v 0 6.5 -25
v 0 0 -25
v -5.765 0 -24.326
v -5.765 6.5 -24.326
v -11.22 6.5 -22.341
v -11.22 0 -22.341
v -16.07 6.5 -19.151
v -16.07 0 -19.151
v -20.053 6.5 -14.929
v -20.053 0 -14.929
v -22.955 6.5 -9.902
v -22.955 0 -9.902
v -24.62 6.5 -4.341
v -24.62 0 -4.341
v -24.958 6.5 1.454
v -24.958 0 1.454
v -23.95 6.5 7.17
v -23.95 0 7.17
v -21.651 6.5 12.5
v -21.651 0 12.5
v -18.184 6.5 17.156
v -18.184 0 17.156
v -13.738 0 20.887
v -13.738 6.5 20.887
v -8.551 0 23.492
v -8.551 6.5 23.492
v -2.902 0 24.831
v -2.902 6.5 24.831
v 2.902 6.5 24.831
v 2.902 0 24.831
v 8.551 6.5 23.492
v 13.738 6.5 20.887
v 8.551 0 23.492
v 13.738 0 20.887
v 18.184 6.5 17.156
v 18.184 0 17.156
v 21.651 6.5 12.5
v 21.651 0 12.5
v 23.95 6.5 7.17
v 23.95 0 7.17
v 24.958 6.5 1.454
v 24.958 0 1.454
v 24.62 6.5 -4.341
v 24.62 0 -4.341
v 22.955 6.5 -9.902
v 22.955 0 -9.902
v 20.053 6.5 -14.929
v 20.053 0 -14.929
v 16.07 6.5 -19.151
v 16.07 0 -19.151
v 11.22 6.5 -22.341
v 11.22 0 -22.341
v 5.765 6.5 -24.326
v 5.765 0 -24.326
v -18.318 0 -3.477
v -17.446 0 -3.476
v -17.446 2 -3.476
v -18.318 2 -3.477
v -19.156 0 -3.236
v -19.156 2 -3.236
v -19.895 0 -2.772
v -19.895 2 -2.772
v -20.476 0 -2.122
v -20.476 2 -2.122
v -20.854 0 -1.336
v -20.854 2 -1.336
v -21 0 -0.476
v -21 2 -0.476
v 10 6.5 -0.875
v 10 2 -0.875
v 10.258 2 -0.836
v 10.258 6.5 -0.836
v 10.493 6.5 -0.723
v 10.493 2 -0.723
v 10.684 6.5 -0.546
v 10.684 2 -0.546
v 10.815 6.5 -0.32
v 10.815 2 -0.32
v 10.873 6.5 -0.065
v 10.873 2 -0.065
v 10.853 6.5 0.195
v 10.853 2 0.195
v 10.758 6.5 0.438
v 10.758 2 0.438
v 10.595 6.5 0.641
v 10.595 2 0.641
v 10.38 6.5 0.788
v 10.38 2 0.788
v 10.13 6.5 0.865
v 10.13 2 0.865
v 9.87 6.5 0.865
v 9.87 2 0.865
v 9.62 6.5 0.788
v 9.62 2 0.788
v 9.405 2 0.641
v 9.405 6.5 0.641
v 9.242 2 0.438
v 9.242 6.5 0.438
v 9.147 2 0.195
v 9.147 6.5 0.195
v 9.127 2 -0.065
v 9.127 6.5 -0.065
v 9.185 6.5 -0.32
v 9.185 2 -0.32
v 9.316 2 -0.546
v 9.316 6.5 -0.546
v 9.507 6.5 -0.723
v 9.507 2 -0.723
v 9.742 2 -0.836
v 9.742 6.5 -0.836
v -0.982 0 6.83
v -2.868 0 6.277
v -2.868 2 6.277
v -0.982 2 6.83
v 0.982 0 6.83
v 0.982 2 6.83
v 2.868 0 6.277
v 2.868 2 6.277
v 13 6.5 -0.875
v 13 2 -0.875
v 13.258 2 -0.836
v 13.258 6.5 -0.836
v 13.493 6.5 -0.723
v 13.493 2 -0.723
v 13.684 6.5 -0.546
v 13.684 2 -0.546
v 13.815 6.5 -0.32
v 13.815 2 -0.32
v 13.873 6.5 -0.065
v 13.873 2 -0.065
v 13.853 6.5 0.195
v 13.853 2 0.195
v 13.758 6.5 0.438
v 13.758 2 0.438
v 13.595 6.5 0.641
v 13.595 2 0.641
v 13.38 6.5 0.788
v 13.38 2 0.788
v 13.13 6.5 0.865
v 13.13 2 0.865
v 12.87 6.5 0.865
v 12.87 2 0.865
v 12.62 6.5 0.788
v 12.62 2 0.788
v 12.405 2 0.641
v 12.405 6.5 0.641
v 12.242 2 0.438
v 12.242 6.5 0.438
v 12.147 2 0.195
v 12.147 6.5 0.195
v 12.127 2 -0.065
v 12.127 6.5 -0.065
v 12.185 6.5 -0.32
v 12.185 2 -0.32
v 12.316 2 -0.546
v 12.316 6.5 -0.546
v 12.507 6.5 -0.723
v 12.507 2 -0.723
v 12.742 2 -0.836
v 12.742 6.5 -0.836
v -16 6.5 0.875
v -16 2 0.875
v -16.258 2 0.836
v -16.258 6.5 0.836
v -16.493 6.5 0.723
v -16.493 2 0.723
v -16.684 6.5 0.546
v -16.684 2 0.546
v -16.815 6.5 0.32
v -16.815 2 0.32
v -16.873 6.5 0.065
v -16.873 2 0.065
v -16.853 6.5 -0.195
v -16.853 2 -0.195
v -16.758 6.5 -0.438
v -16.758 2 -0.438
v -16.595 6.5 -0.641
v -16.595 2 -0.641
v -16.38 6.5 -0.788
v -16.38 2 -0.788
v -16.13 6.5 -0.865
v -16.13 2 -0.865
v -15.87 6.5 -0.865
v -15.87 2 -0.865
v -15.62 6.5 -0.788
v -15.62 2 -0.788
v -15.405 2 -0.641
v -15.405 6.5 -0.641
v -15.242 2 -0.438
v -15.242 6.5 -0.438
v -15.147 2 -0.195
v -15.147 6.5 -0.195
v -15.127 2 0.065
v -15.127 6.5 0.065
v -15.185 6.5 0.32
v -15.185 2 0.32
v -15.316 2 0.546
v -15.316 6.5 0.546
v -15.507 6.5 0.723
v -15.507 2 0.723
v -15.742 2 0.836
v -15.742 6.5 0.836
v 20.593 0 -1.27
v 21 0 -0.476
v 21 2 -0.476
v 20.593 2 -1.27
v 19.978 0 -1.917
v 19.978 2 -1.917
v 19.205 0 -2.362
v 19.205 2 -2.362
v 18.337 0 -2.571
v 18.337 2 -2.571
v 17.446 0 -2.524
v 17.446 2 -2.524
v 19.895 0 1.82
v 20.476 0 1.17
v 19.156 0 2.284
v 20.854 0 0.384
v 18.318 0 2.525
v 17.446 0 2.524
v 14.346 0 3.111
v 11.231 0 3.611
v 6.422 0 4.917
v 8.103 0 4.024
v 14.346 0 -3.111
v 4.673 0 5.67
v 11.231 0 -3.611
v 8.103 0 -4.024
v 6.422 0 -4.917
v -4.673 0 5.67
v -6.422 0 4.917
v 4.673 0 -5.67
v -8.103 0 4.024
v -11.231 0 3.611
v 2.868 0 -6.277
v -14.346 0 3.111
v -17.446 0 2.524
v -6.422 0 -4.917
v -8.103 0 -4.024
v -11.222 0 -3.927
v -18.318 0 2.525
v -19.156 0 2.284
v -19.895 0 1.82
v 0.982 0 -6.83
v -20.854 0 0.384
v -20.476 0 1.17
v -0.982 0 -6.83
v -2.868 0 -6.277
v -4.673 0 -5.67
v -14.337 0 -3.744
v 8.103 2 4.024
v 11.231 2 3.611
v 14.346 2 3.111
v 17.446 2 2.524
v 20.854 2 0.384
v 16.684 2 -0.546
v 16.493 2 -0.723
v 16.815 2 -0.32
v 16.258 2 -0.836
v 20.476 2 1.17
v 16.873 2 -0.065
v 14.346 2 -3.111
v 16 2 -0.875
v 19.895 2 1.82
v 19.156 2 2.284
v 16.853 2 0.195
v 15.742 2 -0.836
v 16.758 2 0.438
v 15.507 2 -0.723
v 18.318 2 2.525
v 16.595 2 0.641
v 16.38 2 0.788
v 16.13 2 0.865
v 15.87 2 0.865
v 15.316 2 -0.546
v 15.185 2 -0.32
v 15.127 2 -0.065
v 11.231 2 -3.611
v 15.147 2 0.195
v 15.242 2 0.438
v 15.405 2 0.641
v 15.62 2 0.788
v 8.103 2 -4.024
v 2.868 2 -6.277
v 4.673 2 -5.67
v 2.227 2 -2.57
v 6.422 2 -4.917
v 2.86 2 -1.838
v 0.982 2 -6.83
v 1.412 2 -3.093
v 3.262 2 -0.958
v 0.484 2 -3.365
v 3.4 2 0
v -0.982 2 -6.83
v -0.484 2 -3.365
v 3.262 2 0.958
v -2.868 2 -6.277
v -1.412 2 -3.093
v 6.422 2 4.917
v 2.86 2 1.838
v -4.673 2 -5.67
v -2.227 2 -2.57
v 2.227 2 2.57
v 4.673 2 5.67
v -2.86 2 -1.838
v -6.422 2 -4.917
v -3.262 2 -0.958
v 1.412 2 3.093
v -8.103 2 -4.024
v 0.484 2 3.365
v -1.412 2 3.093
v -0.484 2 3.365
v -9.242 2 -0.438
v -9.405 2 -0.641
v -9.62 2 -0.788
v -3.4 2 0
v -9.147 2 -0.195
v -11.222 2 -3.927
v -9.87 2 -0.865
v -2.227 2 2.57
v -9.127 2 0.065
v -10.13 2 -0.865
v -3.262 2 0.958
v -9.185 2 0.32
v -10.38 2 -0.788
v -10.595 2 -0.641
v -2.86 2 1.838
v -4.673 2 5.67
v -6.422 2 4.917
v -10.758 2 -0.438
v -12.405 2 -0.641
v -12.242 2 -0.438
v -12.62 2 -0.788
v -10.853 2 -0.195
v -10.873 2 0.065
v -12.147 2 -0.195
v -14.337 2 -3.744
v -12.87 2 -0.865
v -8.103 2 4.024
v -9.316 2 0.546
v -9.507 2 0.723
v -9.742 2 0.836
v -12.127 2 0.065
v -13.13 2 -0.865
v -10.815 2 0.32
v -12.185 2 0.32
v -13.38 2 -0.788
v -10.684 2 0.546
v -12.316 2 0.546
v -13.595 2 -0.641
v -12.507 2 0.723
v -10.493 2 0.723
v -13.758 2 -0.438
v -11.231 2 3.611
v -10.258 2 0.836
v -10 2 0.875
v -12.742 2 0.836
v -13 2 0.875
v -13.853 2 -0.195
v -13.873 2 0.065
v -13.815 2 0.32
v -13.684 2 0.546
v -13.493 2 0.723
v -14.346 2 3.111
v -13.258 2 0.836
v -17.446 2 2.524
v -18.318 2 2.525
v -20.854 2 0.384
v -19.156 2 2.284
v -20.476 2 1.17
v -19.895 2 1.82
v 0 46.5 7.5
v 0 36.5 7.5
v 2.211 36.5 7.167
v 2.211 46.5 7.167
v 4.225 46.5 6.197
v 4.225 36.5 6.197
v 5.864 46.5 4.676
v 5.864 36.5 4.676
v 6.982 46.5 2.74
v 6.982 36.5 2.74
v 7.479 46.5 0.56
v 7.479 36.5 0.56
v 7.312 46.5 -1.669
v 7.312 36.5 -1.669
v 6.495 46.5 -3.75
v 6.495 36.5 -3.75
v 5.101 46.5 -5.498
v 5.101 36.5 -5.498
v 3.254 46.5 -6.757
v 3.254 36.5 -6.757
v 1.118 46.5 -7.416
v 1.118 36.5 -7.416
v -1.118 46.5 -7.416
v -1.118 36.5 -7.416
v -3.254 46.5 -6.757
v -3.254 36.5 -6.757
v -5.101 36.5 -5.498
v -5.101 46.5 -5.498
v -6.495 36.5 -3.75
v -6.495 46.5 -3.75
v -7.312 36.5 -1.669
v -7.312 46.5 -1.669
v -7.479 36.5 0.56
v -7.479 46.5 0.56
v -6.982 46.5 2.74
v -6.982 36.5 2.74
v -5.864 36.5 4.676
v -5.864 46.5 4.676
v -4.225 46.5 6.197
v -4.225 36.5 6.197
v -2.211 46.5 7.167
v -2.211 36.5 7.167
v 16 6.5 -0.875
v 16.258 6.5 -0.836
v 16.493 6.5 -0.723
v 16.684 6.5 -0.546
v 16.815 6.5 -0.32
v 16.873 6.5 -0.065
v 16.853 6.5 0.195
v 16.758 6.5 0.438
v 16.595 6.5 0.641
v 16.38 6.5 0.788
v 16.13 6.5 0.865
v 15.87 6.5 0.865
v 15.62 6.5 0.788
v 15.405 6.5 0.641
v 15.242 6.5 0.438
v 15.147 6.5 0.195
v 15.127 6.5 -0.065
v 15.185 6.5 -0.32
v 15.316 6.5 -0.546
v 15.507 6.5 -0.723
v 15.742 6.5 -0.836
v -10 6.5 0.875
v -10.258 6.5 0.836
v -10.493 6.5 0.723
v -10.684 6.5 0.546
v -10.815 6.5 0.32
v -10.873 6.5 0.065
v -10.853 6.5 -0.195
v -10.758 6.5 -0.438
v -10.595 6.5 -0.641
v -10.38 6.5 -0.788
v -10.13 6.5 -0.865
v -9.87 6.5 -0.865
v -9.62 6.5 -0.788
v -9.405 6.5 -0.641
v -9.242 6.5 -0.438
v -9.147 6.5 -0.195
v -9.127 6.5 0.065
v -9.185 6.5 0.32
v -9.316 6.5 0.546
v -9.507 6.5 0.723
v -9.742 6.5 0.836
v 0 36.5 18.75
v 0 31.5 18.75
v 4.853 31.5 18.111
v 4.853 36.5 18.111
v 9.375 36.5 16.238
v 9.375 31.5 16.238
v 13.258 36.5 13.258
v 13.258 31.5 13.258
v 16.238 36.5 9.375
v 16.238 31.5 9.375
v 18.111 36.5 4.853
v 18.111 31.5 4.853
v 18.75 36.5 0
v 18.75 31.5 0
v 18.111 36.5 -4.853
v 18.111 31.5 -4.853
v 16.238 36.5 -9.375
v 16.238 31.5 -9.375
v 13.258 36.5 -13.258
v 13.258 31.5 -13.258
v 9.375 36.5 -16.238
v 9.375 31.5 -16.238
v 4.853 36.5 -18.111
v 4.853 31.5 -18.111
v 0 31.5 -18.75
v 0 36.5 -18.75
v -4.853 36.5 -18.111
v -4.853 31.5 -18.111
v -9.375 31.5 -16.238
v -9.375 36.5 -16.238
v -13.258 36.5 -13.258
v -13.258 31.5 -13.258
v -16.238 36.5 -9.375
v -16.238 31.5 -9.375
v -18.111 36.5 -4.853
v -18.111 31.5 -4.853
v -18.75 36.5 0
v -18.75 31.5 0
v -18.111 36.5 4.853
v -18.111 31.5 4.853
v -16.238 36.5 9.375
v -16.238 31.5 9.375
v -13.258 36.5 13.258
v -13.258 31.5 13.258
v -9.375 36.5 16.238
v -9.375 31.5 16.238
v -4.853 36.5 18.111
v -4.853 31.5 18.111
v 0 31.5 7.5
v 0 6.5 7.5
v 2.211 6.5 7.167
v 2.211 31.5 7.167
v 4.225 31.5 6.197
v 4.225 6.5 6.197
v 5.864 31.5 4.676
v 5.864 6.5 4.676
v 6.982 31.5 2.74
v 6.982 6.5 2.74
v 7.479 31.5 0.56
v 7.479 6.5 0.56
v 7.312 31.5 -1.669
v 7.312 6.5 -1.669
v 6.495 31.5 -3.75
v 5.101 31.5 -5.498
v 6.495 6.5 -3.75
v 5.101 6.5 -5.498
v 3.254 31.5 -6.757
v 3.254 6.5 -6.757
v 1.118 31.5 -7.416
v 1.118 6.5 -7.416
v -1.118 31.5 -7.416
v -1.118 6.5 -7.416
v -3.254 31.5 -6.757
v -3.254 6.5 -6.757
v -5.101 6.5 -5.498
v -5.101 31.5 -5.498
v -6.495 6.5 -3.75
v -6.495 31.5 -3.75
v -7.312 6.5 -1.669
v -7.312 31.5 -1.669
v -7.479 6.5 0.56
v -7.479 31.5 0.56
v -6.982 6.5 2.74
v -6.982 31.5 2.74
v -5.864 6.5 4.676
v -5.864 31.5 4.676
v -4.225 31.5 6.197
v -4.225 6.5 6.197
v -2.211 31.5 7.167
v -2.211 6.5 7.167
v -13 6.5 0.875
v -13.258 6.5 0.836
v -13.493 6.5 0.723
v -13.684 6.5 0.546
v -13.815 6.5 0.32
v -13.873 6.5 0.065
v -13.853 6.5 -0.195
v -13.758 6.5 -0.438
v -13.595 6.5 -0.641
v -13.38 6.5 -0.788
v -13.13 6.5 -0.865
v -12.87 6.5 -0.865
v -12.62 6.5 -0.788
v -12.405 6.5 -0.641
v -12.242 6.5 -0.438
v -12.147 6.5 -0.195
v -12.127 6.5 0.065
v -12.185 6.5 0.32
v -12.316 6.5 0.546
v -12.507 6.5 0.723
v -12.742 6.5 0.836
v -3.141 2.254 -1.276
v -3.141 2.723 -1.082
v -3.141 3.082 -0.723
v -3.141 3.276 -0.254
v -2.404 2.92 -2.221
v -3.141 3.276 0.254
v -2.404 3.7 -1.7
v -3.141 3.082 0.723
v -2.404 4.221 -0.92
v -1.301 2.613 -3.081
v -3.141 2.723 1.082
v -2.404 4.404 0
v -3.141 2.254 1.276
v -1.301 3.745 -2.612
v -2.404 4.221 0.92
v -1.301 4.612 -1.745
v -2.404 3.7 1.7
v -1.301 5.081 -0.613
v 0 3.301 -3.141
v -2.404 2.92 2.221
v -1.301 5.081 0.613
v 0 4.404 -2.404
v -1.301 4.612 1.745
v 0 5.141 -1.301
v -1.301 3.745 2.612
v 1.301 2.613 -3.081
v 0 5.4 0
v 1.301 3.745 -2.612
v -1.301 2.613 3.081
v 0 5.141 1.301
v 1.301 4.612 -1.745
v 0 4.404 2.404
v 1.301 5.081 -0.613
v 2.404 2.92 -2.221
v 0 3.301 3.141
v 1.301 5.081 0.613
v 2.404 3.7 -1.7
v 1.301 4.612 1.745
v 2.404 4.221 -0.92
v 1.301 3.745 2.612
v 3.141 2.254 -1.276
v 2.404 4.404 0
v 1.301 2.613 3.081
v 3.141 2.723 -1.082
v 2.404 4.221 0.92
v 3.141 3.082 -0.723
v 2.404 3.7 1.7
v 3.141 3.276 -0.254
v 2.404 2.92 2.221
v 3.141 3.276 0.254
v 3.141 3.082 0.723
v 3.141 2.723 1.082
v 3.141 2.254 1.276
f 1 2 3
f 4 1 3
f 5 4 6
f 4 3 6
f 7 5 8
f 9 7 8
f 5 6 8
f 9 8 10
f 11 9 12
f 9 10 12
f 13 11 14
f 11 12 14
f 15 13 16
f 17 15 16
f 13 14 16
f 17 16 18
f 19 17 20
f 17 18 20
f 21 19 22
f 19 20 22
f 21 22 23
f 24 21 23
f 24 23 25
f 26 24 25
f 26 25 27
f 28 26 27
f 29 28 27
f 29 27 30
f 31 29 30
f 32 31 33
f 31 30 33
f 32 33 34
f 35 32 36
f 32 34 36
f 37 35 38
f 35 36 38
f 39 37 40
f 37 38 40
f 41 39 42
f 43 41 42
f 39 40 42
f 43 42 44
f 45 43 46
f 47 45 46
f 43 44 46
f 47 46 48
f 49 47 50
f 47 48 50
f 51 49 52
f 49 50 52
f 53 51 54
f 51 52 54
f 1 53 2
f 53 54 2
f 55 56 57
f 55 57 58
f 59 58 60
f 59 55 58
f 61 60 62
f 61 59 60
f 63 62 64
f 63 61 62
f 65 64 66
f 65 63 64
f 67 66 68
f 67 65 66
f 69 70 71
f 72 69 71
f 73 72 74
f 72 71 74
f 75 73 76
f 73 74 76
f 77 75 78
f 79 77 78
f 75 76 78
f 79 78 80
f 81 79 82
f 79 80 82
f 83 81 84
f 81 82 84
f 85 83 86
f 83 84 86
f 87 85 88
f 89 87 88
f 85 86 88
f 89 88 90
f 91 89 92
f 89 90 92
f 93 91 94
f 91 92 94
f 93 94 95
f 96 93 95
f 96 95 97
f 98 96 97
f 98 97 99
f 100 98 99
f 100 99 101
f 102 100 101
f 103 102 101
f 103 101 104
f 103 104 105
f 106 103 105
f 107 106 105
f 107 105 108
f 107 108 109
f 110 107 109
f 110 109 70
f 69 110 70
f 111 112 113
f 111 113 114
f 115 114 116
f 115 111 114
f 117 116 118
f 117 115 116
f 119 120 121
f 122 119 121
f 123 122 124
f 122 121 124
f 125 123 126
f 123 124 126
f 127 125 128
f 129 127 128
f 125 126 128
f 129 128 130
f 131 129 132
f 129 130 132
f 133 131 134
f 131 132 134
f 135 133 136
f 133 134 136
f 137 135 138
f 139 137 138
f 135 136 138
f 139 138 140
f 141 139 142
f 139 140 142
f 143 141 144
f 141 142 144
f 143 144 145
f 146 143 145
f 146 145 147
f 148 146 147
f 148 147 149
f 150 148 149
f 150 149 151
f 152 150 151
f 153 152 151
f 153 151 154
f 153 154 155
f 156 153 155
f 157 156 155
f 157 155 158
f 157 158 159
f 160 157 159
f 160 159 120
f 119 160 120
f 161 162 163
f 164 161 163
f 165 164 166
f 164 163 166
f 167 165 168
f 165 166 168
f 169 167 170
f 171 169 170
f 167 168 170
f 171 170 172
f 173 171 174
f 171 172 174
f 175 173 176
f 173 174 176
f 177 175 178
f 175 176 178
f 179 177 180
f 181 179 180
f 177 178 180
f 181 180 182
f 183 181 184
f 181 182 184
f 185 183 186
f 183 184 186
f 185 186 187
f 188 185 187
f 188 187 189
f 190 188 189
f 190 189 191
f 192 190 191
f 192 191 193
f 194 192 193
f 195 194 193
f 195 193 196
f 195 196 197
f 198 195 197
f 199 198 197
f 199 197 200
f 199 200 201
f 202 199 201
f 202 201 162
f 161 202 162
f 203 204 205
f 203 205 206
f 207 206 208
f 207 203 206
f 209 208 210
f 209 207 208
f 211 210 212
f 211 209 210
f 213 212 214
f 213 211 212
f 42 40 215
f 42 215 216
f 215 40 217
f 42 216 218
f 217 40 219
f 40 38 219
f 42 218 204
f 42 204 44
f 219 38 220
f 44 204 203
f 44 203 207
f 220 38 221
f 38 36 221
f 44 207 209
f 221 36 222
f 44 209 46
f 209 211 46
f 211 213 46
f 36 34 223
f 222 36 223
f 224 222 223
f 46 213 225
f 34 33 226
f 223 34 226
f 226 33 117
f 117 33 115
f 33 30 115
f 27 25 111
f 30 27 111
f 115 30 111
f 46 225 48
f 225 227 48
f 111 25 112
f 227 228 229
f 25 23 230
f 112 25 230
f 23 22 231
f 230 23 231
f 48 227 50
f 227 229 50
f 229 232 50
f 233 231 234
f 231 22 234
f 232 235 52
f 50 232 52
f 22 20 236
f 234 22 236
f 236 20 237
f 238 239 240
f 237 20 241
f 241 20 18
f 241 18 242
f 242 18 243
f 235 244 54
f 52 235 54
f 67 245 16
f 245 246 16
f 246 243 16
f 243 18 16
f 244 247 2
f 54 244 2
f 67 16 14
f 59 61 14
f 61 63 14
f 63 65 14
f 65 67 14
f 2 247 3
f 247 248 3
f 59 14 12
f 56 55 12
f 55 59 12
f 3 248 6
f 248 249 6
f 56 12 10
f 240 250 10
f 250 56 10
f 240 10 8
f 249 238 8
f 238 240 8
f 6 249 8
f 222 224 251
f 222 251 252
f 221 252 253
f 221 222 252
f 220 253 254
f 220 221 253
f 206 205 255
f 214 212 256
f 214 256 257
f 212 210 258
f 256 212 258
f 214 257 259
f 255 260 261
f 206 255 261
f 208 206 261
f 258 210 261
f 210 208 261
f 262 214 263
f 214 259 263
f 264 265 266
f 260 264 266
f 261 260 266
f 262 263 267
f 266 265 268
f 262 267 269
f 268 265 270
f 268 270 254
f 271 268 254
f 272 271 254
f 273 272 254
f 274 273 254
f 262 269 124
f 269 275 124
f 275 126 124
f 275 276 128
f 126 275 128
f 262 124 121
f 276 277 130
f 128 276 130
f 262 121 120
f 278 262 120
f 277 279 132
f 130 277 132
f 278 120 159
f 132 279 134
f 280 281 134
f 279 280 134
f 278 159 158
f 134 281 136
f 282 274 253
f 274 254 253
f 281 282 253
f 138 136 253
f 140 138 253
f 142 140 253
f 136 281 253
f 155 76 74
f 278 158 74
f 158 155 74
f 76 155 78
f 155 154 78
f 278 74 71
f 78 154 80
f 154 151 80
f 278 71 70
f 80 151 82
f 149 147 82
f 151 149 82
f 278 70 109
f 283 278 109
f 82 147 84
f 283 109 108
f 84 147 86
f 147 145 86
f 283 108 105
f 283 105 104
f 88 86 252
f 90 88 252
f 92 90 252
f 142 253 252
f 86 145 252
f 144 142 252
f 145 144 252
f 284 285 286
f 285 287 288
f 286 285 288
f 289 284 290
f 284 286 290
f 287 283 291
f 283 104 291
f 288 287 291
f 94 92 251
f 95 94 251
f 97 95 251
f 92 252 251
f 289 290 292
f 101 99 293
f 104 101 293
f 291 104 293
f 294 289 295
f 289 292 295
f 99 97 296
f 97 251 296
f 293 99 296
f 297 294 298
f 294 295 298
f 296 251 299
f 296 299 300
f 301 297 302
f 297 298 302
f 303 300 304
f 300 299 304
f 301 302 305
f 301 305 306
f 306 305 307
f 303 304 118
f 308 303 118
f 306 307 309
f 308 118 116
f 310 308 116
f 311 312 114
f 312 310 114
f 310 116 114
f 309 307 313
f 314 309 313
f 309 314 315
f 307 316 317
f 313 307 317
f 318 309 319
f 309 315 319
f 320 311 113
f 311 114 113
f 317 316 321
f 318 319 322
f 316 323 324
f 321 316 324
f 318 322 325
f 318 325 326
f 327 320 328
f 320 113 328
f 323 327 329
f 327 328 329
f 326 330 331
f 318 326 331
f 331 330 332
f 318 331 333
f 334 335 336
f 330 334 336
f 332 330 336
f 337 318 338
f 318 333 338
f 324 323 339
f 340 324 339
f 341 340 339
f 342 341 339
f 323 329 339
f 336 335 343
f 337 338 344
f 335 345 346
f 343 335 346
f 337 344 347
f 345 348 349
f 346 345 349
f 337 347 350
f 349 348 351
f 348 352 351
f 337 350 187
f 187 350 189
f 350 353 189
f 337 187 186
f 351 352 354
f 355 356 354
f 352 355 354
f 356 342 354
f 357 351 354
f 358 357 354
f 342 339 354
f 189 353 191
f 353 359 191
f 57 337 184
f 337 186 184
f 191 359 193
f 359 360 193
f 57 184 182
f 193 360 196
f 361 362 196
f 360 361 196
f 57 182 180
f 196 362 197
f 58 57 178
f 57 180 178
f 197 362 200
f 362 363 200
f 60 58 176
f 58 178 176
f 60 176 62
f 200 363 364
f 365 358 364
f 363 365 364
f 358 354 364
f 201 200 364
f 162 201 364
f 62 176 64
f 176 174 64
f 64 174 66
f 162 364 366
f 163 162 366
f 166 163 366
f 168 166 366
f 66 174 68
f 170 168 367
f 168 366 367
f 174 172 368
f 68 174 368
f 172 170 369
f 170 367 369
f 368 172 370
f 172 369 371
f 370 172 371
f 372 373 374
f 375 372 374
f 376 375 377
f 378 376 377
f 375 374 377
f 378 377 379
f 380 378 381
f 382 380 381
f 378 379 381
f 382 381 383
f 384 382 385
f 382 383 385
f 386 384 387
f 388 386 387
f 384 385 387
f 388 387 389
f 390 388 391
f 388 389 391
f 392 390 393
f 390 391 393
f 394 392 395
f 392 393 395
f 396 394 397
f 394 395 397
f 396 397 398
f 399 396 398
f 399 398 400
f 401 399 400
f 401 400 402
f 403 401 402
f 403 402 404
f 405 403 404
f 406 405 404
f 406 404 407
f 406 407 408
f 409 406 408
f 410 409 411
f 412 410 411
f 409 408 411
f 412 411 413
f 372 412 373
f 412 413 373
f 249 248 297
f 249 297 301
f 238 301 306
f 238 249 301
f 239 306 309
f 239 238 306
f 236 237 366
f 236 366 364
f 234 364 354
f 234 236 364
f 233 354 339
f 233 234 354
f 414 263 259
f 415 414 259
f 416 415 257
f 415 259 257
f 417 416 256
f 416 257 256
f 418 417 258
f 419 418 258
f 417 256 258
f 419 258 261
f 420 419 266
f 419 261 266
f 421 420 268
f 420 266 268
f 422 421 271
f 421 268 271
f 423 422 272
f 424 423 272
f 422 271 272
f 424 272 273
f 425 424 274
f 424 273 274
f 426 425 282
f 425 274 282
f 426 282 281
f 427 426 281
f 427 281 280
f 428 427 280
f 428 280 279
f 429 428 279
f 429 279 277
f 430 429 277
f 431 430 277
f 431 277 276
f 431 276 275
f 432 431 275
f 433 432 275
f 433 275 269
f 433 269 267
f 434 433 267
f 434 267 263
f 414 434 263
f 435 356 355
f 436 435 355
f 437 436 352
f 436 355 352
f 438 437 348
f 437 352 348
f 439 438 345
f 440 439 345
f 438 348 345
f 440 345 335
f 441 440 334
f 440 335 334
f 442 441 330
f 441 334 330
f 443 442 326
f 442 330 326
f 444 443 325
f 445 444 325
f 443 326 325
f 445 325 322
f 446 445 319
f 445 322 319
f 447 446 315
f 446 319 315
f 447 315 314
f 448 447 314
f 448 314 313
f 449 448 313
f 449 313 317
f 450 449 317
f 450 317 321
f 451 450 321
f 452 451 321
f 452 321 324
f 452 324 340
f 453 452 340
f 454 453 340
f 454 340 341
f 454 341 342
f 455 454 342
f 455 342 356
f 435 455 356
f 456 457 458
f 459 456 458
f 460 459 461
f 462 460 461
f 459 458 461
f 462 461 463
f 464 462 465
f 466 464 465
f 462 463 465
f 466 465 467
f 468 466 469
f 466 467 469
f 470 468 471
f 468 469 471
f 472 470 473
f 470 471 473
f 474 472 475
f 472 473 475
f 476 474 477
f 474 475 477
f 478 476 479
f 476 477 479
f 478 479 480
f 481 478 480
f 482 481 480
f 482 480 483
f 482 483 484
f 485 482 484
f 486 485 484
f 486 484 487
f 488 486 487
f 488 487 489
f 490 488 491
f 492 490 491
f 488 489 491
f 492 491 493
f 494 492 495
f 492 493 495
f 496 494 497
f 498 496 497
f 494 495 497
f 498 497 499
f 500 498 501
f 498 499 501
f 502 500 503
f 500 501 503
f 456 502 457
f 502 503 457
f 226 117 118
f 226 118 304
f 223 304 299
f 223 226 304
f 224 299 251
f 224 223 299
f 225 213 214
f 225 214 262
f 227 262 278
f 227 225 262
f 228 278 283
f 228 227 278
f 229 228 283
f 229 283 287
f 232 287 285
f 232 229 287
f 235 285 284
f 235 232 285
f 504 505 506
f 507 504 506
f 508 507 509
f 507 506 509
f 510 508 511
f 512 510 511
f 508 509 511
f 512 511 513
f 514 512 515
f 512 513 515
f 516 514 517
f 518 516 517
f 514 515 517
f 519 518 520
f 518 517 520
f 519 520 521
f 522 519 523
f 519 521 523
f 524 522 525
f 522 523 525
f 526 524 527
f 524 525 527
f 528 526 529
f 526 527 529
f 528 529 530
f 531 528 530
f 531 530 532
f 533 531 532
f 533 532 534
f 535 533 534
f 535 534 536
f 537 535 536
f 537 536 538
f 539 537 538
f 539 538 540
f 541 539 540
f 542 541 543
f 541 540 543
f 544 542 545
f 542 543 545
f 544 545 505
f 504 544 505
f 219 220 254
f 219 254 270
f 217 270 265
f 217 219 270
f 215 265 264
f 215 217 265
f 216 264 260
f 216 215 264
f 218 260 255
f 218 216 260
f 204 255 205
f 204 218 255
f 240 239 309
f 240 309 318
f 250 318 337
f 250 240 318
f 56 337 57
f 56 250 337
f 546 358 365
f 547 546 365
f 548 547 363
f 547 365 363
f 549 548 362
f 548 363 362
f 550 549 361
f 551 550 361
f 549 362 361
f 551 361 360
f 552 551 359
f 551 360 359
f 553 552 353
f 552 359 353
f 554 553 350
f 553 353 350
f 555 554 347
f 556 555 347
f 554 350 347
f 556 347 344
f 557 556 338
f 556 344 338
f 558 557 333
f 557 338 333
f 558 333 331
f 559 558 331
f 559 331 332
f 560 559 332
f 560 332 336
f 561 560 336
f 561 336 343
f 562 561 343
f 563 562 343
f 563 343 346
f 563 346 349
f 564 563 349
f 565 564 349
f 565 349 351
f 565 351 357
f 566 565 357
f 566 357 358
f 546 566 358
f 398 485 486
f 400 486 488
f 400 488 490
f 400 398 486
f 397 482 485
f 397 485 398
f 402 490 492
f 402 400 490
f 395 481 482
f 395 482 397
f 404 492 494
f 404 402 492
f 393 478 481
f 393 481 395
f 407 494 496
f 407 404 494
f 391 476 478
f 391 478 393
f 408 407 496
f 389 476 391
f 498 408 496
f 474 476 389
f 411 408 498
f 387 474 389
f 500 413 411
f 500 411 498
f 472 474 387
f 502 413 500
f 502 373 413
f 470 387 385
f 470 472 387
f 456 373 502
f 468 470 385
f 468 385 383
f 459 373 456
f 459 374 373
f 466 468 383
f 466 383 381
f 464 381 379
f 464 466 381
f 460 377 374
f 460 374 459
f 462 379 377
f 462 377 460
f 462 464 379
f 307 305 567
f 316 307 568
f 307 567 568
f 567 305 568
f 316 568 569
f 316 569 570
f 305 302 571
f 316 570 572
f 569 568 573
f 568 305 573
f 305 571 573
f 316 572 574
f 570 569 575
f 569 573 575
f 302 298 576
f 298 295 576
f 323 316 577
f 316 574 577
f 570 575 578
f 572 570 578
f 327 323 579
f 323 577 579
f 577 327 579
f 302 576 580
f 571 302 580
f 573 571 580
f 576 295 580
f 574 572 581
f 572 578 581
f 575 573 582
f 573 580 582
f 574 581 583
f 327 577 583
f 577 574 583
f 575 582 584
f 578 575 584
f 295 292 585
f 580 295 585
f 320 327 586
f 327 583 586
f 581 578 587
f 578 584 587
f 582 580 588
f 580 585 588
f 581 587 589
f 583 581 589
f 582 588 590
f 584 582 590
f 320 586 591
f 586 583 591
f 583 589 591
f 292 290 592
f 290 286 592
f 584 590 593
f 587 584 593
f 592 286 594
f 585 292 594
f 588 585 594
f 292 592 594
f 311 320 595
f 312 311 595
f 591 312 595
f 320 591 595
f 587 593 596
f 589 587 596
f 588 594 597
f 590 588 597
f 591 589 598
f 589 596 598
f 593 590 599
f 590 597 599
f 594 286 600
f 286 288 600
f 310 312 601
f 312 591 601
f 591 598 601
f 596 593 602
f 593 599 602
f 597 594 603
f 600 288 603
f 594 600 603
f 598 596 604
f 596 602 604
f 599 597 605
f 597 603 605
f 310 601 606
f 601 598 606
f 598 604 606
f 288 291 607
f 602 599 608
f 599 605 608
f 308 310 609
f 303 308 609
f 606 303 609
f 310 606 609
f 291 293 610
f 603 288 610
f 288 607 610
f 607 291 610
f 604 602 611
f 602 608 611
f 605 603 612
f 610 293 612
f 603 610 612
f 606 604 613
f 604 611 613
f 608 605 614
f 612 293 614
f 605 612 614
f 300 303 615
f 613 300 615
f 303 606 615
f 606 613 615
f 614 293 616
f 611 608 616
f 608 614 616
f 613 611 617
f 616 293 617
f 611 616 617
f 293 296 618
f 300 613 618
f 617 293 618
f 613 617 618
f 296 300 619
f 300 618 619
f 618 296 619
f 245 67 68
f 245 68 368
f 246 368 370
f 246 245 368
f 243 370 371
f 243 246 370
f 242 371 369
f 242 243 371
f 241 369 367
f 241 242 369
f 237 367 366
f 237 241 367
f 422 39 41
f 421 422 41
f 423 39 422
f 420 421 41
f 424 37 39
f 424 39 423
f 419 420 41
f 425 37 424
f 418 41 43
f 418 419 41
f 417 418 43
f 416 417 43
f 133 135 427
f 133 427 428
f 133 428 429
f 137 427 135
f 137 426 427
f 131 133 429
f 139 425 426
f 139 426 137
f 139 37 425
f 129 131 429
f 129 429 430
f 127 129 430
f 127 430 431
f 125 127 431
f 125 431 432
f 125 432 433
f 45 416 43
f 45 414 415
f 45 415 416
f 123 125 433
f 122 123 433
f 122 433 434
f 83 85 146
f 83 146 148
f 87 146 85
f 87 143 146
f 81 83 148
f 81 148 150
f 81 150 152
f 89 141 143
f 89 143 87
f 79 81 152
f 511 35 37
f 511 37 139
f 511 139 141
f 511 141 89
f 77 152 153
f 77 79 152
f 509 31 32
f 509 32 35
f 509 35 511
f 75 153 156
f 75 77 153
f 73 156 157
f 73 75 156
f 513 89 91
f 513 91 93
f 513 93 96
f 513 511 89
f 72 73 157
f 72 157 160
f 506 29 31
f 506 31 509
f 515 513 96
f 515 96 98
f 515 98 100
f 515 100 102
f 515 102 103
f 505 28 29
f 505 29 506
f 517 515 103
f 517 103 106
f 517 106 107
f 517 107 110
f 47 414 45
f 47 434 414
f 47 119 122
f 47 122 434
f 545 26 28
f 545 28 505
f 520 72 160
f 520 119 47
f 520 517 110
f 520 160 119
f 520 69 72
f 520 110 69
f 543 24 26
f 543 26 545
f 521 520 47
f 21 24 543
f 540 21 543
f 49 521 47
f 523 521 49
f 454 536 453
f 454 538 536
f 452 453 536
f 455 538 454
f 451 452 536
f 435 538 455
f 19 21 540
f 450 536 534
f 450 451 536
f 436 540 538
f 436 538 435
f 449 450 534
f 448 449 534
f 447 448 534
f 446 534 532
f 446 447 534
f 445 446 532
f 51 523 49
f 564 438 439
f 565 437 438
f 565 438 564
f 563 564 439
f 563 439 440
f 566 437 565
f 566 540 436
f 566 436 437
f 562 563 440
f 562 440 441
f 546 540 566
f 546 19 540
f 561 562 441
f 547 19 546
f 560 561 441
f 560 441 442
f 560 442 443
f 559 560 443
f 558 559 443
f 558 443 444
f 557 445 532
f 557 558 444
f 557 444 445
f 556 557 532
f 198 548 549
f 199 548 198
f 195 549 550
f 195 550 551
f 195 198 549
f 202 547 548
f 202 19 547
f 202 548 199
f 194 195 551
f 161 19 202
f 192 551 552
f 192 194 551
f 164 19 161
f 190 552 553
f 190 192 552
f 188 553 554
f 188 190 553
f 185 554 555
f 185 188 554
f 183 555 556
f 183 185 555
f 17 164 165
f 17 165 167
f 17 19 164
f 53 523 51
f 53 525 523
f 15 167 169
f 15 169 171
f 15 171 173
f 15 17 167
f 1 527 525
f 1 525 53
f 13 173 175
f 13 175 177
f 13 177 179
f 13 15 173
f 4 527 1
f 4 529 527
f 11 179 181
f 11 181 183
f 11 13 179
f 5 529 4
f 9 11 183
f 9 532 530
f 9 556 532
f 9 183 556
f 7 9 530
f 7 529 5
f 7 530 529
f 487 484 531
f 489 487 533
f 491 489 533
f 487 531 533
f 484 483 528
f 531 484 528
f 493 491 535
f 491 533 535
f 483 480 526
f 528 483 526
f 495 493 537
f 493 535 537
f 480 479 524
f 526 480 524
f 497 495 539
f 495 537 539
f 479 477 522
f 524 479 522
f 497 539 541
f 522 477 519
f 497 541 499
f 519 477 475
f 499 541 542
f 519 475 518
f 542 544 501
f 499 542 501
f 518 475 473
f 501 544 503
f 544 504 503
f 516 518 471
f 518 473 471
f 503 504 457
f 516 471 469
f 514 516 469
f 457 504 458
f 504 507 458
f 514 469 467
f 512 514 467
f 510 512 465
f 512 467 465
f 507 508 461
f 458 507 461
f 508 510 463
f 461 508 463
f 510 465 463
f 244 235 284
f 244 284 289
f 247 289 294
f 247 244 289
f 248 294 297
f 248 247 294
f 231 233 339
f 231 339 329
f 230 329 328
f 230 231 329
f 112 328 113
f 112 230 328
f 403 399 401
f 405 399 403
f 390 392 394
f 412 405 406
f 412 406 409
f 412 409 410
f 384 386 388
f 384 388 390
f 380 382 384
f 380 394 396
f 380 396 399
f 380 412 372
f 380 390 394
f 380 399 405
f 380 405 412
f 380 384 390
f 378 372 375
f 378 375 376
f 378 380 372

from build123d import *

# Parameters (mm, degrees)
SKETCH1_R             = 25
BOSS_EXTRUDE1_DEPTH   = 6.5
HORN_HOLE_DEPTH       = 2
SCREW_HOLES_REACH     = 37.641
SKETCH9_R             = 0.875
SKETCH11_R            = 7.5
BOSS_EXTRUDE2_DEPTH   = 25
SKETCH12_R            = 18.75
BOSS_EXTRUDE3_DEPTH   = 5
SCREW_HEAD_HOLE_ANGLE = 180
BOSS_EXTRUDE4_START   = 30
SKETCH11_2_R          = 7.5
BOSS_EXTRUDE4_DEPTH   = 10


with BuildPart() as part:
    # Sketch1 → Boss-Extrude1 (new body)
    with BuildSketch(Plane(origin=(0, 0, 0), x_dir=(1, 0, 0), z_dir=(0, 1, 0))):
        with Locations(Location((0, 0, 0), (0, 0, 90))):
            Circle(SKETCH1_R)
    extrude(amount=BOSS_EXTRUDE1_DEPTH)

    # Sketch8 → Horn Hole (cut)
    with BuildSketch(Plane.XZ):
        with BuildLine():
            ThreePointArc((2.867832451, 6.276606431), (5.55485913, 5.311303559), (8.103473198, 4.024257195))
            ThreePointArc((8.103473198, 4.024257195), (12.790122891, 3.37163327), (17.445502266, 2.524257195))
            ThreePointArc((17.445502266, 2.524257195), (19.894779582, 1.820498395), (21, -0.475742805))
            ThreePointArc((21, -0.475742805), (19.60737188, -2.167378066), (17.445502266, -2.524257195))
            ThreePointArc((17.445502266, -2.524257195), (12.790122891, -3.37163327), (8.103473198, -4.024257195))
            ThreePointArc((8.103473198, -4.024257195), (5.55485913, -5.311303559), (2.867832451, -6.276606431))
            ThreePointArc((2.867832451, -6.276606431), (0, -6.900742805), (-2.867832451, -6.276606431))
            ThreePointArc((-2.867832451, -6.276606431), (-5.55485913, -5.311303559), (-8.103473198, -4.024257195))
            ThreePointArc((-8.103473198, -4.024257195), (-12.780142502, -3.846309279), (-17.445502266, -3.475742805))
            ThreePointArc((-17.445502266, -3.475742805), (-19.894779582, -2.771984005), (-21, -0.475742805))
            ThreePointArc((-21, -0.475742805), (-19.894779582, 1.820498395), (-17.445502266, 2.524257195))
            ThreePointArc((-17.445502266, 2.524257195), (-12.790122891, 3.37163327), (-8.103473198, 4.024257195))
            ThreePointArc((-8.103473198, 4.024257195), (-5.55485913, 5.311303559), (-2.867832451, 6.276606431))
            ThreePointArc((-2.867832451, 6.276606431), (0, 6.900742805), (2.867832451, 6.276606431))
        make_face()
    extrude(amount=-HORN_HOLE_DEPTH, mode=Mode.SUBTRACT)

    # Sketch9 → Screw Holes (cut, up to next)
    with BuildSketch(Plane.XZ.offset(-2), mode=Mode.PRIVATE) as screw_holes_sk1:
        with Locations(Location((10, 0, 0), (0, 0, 270))):
            Circle(SKETCH9_R)
    screw_holes_tool1 = extrude(screw_holes_sk1.sketch, amount=-SCREW_HOLES_REACH, mode=Mode.PRIVATE) & part.part
    # Sketch9 → Screw Holes (cut, up to next)
    with BuildSketch(Plane.XZ.offset(-2), mode=Mode.PRIVATE) as screw_holes_sk2:
        with Locations(Location((13, 0, 0), (0, 0, 270))):
            Circle(SKETCH9_R)
    screw_holes_tool2 = extrude(screw_holes_sk2.sketch, amount=-SCREW_HOLES_REACH, mode=Mode.PRIVATE) & part.part
    # Sketch9 → Screw Holes (cut, up to next)
    with BuildSketch(Plane.XZ.offset(-2), mode=Mode.PRIVATE) as screw_holes_sk3:
        with Locations(Location((16, 0, 0), (0, 0, 270))):
            Circle(SKETCH9_R)
    screw_holes_tool3 = extrude(screw_holes_sk3.sketch, amount=-SCREW_HOLES_REACH, mode=Mode.PRIVATE) & part.part
    # Sketch9 → Screw Holes (cut, up to next)
    with BuildSketch(Plane.XZ.offset(-2), mode=Mode.PRIVATE) as screw_holes_sk4:
        with Locations(Location((-10, 0, 0), (0, 0, 90))):
            Circle(SKETCH9_R)
    screw_holes_tool4 = extrude(screw_holes_sk4.sketch, amount=-SCREW_HOLES_REACH, mode=Mode.PRIVATE) & part.part
    # Sketch9 → Screw Holes (cut, up to next)
    with BuildSketch(Plane.XZ.offset(-2), mode=Mode.PRIVATE) as screw_holes_sk5:
        with Locations(Location((-13, 0, 0), (0, 0, 90))):
            Circle(SKETCH9_R)
    screw_holes_tool5 = extrude(screw_holes_sk5.sketch, amount=-SCREW_HOLES_REACH, mode=Mode.PRIVATE) & part.part
    # Sketch9 → Screw Holes (cut, up to next)
    with BuildSketch(Plane.XZ.offset(-2), mode=Mode.PRIVATE) as screw_holes_sk6:
        with Locations(Location((-16, 0, 0), (0, 0, 90))):
            Circle(SKETCH9_R)
    screw_holes_tool6 = extrude(screw_holes_sk6.sketch, amount=-SCREW_HOLES_REACH, mode=Mode.PRIVATE) & part.part
    add(screw_holes_tool1.solids().sort_by_distance((10, 2, 0))[0], mode=Mode.SUBTRACT)
    add(screw_holes_tool2.solids().sort_by_distance((13, 2, 0))[0], mode=Mode.SUBTRACT)
    add(screw_holes_tool3.solids().sort_by_distance((16, 2, 0))[0], mode=Mode.SUBTRACT)
    add(screw_holes_tool4.solids().sort_by_distance((-10, 2, 0))[0], mode=Mode.SUBTRACT)
    add(screw_holes_tool5.solids().sort_by_distance((-13, 2, 0))[0], mode=Mode.SUBTRACT)
    add(screw_holes_tool6.solids().sort_by_distance((-16, 2, 0))[0], mode=Mode.SUBTRACT)

    # Sketch11 → Boss-Extrude2 (add)
    with BuildSketch(Plane(origin=(0, 6.5, 0), x_dir=(1, 0, 0), z_dir=(0, 1, 0))):
        with Locations(Location((0, 0, 0), (0, 0, 270))):
            Circle(SKETCH11_R)
    extrude(amount=BOSS_EXTRUDE2_DEPTH)

    # Sketch12 → Boss-Extrude3 (add)
    with BuildSketch(Plane(origin=(0, 31.5, 0), x_dir=(1, 0, 0), z_dir=(0, 1, 0))):
        with Locations(Location((0, 0, 0), (0, 0, 270))):
            Circle(SKETCH12_R)
    extrude(amount=BOSS_EXTRUDE3_DEPTH)

    # Sketch13 → Screw Head Hole (revolve, cut)
    with BuildSketch(Plane.XZ.offset(-2)):
        with BuildLine():
            Line((3.4, 0), (-3.4, 0))
            ThreePointArc((-3.4, 0), (0, -3.4), (3.4, 0))
        make_face()
    revolve(axis=Axis((3.4, 2, 0), (1, 0, 0)), revolution_arc=SCREW_HEAD_HOLE_ANGLE, mode=Mode.SUBTRACT)

    # Sketch11<2> → Boss-Extrude4 (add)
    with BuildSketch(Plane(origin=(0, 6.5, 0), x_dir=(1, 0, 0), z_dir=(0, 1, 0)).offset(BOSS_EXTRUDE4_START)):
        with Locations(Location((0, 0, 0), (0, 0, 270))):
            Circle(SKETCH11_2_R)
    extrude(amount=BOSS_EXTRUDE4_DEPTH)


solid = part.part
